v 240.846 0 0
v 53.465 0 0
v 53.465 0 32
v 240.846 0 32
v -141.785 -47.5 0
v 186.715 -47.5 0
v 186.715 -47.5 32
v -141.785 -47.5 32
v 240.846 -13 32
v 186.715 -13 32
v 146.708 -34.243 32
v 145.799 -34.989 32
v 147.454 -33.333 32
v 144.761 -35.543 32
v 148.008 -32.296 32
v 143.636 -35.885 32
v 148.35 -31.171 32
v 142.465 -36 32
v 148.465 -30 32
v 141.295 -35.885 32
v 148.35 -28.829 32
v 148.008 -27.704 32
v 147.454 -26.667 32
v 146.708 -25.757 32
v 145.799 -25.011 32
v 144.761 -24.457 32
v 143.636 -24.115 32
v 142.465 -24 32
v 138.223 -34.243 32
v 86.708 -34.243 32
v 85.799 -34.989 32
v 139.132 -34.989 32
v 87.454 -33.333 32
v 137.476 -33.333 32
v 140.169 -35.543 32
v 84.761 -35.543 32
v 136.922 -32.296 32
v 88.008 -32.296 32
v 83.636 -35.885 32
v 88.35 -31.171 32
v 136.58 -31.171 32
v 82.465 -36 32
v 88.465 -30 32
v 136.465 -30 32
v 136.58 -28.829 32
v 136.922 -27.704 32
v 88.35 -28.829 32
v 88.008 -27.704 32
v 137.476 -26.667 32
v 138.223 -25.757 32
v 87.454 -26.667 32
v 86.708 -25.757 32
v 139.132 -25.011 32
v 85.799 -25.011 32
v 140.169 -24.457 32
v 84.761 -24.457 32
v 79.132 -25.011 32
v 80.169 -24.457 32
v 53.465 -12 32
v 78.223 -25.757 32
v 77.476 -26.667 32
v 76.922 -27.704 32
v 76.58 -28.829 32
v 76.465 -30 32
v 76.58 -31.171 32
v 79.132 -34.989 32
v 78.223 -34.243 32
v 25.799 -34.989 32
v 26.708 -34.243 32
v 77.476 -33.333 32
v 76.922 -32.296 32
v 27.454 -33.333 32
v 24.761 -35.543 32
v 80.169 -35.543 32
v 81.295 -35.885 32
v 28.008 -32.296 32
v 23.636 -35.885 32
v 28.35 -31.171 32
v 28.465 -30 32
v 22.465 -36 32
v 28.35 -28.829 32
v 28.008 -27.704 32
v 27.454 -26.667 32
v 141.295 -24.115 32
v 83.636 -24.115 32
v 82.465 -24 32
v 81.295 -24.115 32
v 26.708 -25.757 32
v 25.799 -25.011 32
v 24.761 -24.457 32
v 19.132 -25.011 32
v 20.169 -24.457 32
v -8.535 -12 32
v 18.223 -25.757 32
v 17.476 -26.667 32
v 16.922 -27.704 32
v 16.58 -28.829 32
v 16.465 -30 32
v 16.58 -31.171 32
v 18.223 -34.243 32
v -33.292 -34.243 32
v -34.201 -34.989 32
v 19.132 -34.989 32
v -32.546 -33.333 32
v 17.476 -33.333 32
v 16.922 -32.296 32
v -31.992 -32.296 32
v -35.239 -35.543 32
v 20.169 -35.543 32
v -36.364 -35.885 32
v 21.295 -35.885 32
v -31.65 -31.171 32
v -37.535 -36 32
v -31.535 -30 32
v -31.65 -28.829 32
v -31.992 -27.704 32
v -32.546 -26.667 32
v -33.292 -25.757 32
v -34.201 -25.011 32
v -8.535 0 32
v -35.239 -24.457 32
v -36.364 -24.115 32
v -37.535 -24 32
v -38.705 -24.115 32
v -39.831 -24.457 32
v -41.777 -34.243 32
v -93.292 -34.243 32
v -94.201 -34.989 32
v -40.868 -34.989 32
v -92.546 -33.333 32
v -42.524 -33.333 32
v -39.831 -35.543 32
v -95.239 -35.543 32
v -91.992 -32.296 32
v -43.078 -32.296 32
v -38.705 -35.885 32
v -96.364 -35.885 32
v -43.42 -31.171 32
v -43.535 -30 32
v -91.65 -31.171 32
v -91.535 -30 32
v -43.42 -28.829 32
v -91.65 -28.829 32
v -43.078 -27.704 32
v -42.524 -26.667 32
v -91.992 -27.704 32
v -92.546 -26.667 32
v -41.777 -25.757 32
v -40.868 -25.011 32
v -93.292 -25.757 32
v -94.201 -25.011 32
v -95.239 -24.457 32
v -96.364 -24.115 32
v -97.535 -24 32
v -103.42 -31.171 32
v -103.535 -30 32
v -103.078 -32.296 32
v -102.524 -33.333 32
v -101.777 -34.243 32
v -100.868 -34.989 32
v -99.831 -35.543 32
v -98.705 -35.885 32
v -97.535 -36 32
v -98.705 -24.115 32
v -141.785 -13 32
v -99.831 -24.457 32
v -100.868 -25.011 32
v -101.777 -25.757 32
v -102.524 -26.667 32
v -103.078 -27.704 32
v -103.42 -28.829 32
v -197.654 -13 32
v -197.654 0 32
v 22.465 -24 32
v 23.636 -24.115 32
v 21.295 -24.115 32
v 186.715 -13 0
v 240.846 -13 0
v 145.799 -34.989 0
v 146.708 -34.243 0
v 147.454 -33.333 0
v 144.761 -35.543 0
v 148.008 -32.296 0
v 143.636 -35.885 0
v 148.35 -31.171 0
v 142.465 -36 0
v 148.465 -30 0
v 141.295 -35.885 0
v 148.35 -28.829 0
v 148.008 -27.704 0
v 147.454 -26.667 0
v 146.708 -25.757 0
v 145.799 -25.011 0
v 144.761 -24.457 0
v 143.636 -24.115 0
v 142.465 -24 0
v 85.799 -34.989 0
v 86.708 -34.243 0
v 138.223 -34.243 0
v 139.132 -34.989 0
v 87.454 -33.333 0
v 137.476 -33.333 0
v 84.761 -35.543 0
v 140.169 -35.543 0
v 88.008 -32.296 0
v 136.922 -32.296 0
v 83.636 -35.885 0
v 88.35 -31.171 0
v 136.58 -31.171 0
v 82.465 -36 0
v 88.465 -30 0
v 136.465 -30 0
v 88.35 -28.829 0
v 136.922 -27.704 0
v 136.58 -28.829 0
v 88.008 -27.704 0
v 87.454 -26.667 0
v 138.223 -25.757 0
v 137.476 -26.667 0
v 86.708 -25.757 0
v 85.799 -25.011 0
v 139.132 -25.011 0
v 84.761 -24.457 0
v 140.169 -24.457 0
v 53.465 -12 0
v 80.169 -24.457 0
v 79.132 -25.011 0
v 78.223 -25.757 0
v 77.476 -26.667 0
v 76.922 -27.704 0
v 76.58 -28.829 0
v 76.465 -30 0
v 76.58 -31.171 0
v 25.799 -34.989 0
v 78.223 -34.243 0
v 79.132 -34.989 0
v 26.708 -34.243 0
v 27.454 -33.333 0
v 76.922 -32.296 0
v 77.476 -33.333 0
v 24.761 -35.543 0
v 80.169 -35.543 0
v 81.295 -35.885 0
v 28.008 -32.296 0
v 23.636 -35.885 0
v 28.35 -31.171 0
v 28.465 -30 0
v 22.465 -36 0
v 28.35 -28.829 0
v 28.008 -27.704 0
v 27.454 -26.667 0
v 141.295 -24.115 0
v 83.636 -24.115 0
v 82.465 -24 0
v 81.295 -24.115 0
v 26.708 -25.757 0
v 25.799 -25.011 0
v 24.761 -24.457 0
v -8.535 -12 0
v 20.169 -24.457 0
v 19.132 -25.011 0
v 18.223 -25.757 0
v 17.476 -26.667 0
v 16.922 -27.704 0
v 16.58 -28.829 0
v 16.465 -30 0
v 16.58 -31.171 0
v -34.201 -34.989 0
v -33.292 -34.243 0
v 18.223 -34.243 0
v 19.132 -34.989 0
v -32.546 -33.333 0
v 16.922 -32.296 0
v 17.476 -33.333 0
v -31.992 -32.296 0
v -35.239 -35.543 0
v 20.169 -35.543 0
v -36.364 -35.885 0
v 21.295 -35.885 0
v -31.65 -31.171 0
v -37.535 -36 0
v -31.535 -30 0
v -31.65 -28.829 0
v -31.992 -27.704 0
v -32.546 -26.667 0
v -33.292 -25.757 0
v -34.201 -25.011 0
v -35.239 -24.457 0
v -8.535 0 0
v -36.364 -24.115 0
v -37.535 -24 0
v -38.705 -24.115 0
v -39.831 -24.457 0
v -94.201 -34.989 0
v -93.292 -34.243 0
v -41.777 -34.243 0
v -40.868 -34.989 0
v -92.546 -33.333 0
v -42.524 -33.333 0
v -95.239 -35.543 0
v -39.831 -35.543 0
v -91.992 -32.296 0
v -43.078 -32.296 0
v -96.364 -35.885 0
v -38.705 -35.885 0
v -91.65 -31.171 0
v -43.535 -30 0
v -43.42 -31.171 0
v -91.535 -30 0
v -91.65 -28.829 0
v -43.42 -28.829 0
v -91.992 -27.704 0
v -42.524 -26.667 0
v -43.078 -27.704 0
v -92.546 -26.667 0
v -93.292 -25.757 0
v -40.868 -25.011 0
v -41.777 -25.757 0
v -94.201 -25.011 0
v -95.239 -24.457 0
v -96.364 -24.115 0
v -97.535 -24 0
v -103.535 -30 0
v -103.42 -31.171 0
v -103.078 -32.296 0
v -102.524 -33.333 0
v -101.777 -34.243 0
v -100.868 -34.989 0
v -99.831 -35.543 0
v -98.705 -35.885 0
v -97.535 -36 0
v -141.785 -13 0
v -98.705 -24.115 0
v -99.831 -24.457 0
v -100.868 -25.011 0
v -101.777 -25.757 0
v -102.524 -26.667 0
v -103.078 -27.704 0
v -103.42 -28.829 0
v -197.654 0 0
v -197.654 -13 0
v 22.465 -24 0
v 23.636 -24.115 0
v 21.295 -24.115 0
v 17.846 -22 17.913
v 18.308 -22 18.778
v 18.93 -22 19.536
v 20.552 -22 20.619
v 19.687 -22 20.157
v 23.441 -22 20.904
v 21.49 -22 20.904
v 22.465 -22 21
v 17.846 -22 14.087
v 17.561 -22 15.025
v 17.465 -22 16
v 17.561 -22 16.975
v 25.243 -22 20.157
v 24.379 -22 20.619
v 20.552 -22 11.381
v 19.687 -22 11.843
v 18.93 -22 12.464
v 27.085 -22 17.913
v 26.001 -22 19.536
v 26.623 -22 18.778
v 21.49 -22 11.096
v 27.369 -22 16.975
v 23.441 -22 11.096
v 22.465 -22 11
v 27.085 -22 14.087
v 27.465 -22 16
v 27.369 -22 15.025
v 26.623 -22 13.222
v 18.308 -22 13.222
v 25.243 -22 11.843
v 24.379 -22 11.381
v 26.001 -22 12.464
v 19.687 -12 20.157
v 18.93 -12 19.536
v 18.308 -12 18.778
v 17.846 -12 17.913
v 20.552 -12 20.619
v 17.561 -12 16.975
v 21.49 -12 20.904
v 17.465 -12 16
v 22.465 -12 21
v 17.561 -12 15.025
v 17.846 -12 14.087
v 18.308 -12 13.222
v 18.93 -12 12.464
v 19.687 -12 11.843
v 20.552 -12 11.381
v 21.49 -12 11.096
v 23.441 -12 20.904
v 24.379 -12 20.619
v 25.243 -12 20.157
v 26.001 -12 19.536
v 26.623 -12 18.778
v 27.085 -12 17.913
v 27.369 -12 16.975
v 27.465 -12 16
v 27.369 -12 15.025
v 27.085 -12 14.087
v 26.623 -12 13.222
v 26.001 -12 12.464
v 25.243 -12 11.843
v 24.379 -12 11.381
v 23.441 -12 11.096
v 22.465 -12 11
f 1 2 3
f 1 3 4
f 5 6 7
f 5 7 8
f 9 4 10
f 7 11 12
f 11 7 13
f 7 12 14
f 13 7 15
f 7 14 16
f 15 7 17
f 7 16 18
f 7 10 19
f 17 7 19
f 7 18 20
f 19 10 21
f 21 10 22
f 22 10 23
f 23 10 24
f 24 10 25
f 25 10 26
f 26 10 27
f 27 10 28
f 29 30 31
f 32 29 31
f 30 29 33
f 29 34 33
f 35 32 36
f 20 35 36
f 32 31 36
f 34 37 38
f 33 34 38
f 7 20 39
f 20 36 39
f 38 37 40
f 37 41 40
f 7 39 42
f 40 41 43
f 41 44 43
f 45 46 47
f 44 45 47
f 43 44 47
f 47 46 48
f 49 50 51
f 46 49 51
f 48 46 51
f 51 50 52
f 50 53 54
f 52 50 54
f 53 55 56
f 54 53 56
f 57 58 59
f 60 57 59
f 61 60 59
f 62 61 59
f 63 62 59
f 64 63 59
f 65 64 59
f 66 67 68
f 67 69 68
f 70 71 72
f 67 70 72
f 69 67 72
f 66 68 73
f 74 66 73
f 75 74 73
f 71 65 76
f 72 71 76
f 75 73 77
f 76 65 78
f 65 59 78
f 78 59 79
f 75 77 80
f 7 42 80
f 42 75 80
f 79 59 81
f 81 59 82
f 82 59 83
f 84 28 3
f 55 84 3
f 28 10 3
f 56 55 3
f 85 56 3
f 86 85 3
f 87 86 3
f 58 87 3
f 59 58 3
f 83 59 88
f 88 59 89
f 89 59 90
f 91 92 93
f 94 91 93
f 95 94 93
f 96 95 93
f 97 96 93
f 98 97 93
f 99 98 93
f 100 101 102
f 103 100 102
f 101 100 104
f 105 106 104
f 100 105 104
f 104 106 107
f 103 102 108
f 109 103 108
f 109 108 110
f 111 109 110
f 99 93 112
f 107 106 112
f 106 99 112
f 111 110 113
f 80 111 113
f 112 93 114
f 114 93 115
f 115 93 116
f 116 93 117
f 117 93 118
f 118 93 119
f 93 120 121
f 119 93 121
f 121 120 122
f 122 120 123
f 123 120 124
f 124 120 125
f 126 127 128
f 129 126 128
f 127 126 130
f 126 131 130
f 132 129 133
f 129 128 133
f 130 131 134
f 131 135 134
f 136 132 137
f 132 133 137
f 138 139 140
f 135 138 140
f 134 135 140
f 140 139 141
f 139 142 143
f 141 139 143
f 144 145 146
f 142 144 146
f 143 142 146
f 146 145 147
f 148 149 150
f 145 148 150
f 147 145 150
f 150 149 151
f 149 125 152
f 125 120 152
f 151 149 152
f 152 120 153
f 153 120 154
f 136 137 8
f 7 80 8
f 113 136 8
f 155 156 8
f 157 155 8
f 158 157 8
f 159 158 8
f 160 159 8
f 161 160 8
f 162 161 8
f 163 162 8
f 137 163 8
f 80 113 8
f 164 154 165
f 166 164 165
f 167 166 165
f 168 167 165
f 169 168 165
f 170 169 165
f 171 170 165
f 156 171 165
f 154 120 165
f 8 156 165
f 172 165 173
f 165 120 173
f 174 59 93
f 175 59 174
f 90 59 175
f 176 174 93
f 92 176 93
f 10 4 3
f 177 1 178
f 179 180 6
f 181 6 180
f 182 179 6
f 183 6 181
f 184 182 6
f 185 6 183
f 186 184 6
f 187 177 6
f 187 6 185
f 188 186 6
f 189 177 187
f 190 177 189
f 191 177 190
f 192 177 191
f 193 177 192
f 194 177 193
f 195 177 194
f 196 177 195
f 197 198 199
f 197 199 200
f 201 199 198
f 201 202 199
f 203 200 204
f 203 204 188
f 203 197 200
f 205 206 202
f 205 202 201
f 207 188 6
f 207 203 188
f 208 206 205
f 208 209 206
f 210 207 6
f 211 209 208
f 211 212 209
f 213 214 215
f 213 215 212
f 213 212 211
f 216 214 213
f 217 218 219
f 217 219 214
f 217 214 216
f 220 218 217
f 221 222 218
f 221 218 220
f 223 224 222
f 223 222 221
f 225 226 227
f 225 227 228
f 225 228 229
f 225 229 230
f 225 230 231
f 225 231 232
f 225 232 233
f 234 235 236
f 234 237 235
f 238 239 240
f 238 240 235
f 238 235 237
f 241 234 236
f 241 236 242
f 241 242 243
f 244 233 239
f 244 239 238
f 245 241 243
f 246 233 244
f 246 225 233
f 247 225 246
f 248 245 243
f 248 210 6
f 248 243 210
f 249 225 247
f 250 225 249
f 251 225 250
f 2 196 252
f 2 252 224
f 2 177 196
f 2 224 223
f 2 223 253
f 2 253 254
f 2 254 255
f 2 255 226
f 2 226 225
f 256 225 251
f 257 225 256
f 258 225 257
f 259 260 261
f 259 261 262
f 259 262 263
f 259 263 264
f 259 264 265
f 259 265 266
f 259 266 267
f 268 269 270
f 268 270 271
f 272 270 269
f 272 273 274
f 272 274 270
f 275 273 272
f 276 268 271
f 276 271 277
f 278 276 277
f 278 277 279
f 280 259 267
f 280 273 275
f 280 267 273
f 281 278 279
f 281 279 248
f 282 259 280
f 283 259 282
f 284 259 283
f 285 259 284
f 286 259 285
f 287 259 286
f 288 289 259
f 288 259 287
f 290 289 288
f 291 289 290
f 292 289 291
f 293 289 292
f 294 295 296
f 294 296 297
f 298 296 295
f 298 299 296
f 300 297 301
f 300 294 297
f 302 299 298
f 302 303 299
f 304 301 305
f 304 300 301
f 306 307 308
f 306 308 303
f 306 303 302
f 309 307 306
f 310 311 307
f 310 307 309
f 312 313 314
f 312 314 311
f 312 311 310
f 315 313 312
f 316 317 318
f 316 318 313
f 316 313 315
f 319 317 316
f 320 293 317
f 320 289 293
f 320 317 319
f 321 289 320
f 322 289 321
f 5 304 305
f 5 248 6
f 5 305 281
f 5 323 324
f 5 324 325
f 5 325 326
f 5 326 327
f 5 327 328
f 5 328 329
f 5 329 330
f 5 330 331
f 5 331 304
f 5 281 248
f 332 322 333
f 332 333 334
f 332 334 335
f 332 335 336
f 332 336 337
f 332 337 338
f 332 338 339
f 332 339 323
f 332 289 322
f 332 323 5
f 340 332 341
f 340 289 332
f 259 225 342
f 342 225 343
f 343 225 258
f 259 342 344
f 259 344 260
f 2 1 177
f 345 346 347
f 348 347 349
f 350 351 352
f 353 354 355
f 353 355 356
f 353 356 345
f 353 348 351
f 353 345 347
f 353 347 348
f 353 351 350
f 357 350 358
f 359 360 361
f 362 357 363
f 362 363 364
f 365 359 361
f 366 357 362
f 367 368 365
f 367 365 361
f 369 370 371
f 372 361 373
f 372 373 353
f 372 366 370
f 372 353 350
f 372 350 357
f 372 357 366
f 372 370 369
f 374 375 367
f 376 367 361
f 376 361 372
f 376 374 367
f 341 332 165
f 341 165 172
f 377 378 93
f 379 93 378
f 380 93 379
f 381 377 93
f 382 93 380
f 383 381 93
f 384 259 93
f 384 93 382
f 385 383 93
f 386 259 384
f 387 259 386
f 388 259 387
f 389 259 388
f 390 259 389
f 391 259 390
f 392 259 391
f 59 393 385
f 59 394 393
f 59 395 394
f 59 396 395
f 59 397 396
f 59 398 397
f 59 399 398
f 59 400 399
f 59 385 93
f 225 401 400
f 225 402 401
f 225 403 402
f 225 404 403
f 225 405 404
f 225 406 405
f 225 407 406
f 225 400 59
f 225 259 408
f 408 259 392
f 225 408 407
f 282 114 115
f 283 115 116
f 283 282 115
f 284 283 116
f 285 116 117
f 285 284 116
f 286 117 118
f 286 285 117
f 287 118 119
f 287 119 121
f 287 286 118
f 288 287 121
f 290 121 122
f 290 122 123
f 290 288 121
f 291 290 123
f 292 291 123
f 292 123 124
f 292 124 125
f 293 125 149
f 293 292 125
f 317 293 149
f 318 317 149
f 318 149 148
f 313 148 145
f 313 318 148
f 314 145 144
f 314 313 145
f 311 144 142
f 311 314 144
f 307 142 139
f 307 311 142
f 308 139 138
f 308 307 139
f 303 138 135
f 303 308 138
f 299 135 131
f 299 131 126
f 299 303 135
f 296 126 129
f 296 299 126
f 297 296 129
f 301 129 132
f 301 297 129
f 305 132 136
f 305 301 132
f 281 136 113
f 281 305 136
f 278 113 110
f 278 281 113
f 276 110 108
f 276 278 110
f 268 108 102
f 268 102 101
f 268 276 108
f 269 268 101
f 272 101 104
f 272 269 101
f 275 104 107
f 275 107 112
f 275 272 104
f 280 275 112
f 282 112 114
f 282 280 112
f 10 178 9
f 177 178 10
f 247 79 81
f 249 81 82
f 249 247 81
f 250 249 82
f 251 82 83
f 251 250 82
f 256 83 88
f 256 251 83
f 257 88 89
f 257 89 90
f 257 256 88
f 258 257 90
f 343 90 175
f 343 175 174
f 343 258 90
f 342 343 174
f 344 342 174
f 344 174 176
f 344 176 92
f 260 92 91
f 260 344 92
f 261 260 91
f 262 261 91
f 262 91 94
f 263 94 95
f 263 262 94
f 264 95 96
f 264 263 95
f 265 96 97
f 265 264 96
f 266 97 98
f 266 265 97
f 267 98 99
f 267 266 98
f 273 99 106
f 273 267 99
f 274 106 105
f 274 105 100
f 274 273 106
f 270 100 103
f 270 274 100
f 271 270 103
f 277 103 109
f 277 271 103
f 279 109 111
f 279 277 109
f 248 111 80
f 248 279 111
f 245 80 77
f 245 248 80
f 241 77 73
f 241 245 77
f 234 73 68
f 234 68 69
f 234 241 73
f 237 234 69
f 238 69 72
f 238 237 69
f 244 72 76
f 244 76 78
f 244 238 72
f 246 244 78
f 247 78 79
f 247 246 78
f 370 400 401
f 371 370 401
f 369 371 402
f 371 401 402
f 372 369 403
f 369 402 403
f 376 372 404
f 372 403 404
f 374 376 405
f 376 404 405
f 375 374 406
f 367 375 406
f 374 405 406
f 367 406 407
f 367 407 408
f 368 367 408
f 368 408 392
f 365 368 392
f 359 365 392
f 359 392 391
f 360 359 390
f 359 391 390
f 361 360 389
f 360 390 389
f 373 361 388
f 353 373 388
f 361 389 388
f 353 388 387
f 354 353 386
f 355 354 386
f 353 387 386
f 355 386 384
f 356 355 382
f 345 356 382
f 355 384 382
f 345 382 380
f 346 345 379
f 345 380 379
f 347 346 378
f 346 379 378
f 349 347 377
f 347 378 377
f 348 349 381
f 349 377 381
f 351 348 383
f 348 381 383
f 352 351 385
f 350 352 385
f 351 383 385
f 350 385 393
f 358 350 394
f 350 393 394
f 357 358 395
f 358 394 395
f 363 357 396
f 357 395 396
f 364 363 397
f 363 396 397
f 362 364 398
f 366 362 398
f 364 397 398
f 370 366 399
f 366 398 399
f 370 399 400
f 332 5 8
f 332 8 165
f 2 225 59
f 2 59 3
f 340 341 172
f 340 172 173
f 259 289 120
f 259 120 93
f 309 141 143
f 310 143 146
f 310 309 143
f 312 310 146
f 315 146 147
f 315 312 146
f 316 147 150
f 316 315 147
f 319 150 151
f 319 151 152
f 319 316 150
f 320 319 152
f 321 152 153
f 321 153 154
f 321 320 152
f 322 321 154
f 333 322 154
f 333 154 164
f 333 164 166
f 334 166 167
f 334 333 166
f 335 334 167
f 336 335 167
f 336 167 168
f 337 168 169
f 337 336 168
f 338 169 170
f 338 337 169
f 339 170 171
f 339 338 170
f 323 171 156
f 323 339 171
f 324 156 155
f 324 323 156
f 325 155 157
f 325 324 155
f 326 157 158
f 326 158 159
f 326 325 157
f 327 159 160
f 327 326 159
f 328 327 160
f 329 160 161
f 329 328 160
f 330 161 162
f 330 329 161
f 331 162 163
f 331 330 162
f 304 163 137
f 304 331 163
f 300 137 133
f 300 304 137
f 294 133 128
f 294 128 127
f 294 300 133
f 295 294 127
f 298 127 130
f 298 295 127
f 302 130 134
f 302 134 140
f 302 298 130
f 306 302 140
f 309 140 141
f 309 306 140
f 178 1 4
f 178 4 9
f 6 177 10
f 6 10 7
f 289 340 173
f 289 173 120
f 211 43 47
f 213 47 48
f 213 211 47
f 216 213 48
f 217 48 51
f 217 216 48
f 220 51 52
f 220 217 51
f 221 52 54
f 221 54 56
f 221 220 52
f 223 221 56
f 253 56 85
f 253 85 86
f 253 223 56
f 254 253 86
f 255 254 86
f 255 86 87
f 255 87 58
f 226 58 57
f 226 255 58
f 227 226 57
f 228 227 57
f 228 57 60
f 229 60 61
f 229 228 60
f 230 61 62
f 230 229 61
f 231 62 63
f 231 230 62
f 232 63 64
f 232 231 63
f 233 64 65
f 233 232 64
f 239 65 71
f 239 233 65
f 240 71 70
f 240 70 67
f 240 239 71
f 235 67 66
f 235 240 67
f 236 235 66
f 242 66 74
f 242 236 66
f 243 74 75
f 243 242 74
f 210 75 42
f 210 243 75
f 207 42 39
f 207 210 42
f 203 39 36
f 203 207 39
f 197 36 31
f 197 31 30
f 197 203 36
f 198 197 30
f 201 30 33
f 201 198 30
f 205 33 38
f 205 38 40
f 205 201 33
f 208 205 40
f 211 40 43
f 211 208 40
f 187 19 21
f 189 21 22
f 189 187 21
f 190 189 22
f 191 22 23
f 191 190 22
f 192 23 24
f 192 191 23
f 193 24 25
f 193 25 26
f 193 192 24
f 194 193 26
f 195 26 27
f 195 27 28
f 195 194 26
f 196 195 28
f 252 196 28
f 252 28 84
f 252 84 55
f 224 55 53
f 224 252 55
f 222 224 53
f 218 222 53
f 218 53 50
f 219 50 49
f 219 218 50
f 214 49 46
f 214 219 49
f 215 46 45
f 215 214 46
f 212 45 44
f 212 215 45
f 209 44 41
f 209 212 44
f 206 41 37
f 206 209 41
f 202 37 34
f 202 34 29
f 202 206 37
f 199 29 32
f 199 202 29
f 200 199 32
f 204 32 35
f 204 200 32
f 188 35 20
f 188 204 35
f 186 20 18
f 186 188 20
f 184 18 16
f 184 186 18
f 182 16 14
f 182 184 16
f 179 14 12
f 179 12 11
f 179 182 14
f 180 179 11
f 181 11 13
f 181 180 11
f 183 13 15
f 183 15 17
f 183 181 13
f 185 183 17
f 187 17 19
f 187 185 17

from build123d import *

# Parameters (mm, degrees)
CROQUIS1_R              = 6
SALIENTE_EXTRUIR1_DEPTH = 32
CROQUIS2_R              = 5
CORTAR_EXTRUIR1_DEPTH   = 10


with BuildPart() as part:
    # Croquis1 → Saliente-Extruir1 (new body)
    with BuildSketch(Plane.XY):
        Polygon((-197.653640257, 0), (-8.534796574, 0), (-8.534796574, -12), (53.465203426, -12), (53.465203426, 0), (240.846359743, 0), (240.846359743, -13), (186.715203426, -13), (186.715203426, -47.5), (-141.784796574, -47.5), (-141.784796574, -13), (-197.653640257, -13), align=None)
        with Locations((22.465203426, -30)):
            Circle(CROQUIS1_R, mode=Mode.SUBTRACT)
        with Locations((82.465203426, -30)):
            Circle(CROQUIS1_R, mode=Mode.SUBTRACT)
        with Locations((142.465203426, -30)):
            Circle(CROQUIS1_R, mode=Mode.SUBTRACT)
        with Locations((-37.534796574, -30)):
            Circle(CROQUIS1_R, mode=Mode.SUBTRACT)
        with Locations((-97.534796574, -30)):
            Circle(CROQUIS1_R, mode=Mode.SUBTRACT)
    extrude(amount=SALIENTE_EXTRUIR1_DEPTH)

    # Croquis2 → Cortar-Extruir1 (cut)
    with BuildSketch(Plane(origin=(0, -12, 0), x_dir=(1, 0, 0), z_dir=(0, 1, 0))):
        with Locations((22.465203426, -16)):
            Circle(CROQUIS2_R)
    extrude(amount=-CORTAR_EXTRUIR1_DEPTH, mode=Mode.SUBTRACT)


solid = part.part
